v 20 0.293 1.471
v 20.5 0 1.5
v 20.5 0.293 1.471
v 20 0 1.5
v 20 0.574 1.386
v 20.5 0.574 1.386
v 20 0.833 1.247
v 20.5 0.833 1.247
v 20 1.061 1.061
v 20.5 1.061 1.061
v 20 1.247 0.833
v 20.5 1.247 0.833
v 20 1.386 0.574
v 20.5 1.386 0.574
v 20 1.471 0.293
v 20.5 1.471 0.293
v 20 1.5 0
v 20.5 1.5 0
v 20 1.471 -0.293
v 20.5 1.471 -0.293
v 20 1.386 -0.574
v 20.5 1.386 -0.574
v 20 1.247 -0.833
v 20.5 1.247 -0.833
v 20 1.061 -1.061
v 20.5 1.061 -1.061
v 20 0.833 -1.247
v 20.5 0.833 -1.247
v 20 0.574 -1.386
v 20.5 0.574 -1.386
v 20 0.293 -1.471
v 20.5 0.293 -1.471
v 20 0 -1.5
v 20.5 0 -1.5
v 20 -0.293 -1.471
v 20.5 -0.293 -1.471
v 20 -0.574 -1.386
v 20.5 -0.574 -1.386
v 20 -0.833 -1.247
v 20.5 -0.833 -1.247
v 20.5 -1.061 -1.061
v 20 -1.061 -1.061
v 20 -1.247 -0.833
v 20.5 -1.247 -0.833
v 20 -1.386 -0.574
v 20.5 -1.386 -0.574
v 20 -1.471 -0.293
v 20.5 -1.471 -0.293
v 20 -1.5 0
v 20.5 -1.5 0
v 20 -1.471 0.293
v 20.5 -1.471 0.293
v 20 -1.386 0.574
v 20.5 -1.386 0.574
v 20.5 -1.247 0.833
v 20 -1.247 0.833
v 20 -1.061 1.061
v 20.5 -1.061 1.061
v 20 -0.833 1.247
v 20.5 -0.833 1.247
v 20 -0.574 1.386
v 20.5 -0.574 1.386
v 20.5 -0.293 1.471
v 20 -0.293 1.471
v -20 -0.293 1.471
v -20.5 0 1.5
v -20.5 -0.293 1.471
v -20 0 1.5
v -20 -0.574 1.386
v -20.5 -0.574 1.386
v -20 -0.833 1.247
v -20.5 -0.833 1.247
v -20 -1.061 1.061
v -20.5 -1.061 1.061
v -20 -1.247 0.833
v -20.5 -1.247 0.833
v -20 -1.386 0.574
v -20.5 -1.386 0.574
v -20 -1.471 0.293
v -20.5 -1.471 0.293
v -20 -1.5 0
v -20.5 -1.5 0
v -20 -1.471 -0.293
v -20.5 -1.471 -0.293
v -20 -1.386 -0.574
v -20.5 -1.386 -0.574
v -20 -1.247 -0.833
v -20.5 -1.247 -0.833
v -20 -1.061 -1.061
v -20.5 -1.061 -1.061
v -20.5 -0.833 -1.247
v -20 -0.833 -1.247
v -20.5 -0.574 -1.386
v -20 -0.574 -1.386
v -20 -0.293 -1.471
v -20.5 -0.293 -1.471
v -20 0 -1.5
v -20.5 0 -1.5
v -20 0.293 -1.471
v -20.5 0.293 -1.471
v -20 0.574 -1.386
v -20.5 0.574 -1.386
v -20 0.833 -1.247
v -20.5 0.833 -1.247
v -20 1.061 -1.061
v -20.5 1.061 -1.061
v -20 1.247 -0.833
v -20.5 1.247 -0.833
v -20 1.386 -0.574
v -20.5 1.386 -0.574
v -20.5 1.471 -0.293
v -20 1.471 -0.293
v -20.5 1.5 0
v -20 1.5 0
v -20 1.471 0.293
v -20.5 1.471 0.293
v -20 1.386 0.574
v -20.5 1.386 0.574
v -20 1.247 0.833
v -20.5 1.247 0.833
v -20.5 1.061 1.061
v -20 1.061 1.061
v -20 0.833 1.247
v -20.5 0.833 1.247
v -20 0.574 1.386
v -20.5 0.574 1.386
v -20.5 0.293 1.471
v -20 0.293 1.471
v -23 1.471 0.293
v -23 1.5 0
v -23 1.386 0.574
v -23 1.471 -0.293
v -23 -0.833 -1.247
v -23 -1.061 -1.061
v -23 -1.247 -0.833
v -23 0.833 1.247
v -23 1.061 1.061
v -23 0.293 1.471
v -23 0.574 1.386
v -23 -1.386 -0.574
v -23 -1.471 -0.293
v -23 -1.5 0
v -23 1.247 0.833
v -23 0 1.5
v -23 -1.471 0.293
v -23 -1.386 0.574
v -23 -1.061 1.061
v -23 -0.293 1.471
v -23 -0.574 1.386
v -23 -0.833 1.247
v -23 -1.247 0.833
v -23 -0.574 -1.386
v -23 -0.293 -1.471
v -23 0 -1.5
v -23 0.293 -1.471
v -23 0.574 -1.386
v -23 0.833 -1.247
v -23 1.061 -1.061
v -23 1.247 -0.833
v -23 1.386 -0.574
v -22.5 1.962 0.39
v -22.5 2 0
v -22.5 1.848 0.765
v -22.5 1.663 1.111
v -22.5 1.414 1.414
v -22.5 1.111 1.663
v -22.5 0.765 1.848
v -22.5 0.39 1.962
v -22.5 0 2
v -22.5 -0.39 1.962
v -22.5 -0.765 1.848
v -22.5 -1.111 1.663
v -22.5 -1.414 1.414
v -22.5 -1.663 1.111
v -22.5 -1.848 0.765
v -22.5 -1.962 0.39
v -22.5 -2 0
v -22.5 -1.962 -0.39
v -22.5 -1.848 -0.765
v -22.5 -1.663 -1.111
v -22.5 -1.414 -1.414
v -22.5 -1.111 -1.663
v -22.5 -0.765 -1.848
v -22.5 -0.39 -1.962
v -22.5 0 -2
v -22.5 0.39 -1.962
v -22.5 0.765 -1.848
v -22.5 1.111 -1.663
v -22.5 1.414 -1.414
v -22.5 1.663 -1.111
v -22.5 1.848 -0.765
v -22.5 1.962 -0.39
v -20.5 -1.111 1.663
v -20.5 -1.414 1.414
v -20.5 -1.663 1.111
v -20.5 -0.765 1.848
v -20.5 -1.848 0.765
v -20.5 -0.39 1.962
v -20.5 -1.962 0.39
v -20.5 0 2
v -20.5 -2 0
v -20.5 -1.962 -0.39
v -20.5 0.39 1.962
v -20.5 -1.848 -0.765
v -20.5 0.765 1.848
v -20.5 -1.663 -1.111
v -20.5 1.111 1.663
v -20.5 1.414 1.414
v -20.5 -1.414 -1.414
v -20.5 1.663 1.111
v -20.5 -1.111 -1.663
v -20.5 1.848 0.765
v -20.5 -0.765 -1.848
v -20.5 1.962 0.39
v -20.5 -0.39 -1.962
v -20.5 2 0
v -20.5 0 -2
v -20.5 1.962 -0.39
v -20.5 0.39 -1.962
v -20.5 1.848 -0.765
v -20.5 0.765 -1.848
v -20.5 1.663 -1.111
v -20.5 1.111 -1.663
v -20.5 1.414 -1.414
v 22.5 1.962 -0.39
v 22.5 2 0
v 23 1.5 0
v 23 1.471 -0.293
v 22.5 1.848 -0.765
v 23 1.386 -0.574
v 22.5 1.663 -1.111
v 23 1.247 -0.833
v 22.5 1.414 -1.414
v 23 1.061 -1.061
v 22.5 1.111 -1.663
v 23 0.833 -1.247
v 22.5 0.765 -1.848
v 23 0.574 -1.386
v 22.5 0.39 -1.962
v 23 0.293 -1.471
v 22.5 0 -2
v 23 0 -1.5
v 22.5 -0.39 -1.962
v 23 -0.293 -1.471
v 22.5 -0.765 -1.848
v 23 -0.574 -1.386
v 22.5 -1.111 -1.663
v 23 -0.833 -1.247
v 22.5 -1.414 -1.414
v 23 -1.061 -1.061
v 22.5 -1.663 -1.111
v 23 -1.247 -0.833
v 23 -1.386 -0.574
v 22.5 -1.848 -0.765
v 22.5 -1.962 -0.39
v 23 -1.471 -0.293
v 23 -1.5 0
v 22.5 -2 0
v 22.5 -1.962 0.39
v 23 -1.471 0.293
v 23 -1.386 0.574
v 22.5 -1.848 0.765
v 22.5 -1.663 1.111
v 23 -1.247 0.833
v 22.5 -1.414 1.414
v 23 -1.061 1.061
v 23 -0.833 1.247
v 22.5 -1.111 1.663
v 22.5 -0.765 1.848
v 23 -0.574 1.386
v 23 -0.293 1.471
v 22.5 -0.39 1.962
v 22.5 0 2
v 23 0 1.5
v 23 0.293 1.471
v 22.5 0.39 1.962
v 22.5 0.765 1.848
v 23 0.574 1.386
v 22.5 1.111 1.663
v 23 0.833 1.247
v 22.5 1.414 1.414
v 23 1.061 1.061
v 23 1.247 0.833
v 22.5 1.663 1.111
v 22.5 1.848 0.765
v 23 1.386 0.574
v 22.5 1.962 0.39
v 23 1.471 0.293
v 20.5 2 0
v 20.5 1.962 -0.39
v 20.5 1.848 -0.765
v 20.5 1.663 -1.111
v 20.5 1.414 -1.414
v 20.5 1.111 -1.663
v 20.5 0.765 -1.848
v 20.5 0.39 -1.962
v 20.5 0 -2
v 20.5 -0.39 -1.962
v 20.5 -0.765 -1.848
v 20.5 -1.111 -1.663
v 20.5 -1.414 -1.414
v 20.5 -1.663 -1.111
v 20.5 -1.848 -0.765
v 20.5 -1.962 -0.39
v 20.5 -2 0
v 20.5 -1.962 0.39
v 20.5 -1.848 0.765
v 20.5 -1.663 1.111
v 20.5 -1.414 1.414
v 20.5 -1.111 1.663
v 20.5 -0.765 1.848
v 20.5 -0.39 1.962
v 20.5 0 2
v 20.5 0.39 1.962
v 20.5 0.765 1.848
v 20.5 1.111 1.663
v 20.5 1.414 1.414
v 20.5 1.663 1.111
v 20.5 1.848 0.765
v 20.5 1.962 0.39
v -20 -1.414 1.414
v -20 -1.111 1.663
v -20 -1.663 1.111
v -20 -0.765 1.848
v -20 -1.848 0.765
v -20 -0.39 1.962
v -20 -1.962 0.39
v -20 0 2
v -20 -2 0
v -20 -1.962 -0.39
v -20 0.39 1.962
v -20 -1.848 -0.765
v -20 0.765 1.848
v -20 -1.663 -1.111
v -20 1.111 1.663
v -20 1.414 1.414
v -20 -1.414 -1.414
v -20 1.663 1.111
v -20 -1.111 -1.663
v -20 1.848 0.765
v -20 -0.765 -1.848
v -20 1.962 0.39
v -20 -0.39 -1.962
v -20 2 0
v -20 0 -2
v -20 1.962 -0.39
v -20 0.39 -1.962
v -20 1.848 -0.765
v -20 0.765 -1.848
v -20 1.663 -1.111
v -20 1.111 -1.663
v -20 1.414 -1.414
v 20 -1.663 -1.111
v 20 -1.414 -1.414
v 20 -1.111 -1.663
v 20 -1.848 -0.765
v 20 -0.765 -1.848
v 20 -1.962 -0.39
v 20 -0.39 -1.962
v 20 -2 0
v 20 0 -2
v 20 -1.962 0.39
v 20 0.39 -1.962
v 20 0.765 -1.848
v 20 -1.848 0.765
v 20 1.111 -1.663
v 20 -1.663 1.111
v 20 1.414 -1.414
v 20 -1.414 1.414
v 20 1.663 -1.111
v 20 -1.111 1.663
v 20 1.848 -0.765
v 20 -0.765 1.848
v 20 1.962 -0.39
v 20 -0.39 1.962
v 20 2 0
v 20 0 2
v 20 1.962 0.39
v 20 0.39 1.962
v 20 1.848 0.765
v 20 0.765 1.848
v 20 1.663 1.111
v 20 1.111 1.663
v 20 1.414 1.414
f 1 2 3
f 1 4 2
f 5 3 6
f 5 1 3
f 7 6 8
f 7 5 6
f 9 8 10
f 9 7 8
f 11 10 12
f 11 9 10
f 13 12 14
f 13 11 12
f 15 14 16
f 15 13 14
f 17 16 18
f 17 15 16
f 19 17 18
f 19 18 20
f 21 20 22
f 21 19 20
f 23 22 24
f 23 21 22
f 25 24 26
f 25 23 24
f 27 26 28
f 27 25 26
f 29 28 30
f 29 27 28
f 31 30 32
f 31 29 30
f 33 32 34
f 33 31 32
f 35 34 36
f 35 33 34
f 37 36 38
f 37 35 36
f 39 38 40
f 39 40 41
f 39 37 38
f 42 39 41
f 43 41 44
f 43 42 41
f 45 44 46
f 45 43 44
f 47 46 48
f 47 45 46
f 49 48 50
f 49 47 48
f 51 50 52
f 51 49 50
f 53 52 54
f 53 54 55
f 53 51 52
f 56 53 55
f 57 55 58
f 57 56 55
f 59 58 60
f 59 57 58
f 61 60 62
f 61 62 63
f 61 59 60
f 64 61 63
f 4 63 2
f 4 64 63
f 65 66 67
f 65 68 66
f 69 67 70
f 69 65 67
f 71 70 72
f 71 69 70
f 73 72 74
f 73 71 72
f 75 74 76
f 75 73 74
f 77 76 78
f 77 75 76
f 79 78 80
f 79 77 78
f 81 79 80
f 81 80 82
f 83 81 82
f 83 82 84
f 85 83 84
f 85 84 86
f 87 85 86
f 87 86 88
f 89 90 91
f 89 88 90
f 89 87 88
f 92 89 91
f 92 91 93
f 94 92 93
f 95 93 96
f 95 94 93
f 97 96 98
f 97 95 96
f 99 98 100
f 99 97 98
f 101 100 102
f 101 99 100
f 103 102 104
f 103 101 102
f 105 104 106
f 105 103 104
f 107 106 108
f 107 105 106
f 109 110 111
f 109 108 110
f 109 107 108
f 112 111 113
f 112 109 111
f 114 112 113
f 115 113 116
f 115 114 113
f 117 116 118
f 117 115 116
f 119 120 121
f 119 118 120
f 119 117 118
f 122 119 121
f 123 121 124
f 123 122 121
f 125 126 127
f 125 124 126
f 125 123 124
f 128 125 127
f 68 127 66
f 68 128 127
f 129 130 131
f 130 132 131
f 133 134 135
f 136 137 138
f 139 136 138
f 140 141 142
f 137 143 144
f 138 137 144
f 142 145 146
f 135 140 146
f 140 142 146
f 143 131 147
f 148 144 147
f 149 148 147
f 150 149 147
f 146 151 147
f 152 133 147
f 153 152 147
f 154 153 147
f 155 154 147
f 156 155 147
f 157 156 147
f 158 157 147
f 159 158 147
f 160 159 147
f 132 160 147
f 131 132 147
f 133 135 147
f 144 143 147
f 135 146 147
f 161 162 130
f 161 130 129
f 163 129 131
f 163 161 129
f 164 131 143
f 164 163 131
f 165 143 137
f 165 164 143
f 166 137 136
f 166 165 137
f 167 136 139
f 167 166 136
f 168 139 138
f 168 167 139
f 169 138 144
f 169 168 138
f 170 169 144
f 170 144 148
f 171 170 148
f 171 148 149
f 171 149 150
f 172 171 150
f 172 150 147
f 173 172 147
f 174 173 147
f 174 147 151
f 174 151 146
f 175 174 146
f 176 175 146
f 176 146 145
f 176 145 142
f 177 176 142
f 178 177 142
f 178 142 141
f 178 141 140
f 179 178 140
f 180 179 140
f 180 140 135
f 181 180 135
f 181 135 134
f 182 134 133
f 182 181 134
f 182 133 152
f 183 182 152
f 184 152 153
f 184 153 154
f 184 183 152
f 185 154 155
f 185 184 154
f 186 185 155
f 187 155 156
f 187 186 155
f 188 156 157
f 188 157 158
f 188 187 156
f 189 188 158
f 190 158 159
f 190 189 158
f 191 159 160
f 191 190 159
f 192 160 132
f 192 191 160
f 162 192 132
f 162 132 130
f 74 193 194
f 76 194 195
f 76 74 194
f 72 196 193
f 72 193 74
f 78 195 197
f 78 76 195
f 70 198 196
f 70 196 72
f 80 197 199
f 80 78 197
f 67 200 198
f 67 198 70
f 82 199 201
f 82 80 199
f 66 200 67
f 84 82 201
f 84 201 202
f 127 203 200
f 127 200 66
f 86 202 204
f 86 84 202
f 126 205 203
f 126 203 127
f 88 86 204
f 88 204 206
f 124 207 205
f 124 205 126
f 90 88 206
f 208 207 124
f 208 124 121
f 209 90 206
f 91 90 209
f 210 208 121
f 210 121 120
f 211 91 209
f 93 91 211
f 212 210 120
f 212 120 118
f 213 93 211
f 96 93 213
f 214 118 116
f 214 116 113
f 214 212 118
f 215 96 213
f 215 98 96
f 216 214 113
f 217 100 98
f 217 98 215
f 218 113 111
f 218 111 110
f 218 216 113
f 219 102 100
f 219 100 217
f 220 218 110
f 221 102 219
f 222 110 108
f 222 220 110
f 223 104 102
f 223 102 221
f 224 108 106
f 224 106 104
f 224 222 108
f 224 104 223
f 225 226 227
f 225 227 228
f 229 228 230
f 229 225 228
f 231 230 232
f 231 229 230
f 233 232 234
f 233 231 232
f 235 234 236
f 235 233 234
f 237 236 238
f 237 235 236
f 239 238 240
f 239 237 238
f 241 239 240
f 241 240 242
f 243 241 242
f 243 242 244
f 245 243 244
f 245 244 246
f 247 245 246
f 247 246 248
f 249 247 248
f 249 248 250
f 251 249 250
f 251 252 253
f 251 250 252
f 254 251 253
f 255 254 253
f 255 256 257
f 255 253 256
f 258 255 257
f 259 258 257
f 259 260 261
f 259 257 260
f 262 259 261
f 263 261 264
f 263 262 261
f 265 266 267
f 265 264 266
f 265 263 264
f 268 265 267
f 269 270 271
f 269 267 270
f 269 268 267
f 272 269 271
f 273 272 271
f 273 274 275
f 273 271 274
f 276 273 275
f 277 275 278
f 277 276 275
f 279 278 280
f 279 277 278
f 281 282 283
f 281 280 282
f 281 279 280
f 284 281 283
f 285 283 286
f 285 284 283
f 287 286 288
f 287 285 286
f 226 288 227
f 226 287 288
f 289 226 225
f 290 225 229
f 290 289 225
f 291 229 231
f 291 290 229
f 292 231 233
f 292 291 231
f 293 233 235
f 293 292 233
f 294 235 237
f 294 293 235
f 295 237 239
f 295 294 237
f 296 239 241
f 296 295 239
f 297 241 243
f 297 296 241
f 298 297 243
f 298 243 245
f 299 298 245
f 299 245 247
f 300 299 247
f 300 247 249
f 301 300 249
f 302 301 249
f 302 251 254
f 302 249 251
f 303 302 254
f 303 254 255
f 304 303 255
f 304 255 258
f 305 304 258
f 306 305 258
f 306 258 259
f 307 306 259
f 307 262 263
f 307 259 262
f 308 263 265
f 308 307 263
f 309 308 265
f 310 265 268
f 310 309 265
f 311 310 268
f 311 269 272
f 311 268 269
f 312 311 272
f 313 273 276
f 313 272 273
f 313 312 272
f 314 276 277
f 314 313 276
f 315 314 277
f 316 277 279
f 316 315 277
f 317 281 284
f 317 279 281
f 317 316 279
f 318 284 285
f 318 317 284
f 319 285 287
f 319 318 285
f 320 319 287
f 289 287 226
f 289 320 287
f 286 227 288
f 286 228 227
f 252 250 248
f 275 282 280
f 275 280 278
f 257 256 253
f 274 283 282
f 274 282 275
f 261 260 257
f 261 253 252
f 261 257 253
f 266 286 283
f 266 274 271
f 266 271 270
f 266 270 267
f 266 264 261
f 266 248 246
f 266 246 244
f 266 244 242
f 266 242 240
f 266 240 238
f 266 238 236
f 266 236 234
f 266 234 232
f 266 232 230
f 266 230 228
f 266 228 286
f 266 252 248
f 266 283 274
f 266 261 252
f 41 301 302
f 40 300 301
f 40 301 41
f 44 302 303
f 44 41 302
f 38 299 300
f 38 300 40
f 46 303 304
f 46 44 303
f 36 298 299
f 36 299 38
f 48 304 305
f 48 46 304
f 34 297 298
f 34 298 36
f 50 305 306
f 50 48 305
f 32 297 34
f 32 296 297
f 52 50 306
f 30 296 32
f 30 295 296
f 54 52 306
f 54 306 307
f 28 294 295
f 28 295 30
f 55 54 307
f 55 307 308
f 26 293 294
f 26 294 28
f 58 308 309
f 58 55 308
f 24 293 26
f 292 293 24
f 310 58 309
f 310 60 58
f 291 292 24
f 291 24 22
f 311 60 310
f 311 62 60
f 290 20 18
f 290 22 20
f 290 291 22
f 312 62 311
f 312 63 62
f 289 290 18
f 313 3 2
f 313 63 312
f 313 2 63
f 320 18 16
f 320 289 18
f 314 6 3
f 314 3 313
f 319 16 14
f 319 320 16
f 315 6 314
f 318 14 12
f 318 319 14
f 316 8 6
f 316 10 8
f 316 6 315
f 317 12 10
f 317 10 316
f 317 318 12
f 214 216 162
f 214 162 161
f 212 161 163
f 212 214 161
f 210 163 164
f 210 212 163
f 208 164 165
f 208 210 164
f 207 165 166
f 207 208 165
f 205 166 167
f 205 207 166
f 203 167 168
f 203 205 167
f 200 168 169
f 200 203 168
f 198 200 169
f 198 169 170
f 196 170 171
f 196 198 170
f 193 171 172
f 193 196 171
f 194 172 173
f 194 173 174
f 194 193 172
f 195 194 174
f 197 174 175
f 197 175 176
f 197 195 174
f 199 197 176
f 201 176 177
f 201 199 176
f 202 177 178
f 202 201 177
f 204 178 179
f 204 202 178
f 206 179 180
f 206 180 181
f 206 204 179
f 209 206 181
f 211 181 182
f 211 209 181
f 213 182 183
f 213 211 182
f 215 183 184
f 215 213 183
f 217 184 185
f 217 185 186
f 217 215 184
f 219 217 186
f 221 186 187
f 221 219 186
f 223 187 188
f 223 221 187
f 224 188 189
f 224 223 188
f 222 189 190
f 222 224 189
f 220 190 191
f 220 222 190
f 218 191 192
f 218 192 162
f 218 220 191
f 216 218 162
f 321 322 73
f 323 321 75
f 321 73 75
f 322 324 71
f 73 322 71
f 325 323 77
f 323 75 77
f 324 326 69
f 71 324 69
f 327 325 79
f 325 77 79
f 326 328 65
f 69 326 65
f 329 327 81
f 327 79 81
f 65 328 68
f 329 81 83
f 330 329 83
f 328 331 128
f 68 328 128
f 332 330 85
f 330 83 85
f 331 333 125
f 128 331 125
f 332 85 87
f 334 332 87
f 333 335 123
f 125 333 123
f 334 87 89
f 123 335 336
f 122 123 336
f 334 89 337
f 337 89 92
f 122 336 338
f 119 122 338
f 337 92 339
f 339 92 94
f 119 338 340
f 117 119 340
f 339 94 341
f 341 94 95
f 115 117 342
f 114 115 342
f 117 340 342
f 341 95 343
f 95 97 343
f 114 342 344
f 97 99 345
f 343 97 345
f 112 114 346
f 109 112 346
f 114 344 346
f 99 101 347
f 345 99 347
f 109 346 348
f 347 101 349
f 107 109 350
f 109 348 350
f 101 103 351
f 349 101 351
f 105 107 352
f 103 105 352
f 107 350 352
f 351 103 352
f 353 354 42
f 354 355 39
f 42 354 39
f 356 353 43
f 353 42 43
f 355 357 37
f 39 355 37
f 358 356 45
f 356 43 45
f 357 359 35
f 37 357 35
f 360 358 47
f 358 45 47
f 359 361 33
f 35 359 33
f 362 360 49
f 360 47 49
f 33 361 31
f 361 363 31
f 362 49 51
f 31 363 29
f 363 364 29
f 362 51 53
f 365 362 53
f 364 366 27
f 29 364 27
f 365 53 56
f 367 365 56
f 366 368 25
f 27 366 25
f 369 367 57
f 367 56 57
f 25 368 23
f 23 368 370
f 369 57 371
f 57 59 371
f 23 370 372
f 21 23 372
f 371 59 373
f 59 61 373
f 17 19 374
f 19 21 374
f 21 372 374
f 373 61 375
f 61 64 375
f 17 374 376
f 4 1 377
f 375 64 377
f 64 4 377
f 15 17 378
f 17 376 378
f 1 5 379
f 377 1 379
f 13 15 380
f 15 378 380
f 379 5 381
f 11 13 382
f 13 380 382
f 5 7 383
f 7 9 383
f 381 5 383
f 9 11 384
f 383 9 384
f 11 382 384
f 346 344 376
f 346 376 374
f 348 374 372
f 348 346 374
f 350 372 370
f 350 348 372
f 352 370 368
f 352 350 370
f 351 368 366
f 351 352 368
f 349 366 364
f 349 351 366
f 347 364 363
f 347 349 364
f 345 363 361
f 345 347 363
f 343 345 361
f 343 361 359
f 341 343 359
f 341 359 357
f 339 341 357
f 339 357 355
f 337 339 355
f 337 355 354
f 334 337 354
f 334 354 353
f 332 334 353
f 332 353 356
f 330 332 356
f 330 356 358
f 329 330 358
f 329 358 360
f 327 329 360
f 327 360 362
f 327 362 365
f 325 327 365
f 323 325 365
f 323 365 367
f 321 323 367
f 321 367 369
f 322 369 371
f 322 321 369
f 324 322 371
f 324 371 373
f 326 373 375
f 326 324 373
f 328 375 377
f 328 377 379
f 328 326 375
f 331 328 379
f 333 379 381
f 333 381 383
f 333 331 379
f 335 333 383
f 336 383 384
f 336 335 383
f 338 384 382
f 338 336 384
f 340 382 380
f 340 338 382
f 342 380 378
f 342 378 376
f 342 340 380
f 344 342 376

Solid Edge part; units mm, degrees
sketch "Sketch1" plane through (0, 0, 0) normal (1, 0, 0) x (0, 1, 0)
  circle A0 centre (0, 0) radius 2
extrude "Protrusion1" add sketch "Sketch1" along normal mid plane 46
chamfer "Chamfer_1" distance 0.5 angle 45 2 edges at (23, -2, 0) (-23, -2, 0)
sketch "Sketch2" plane through (0, 0, 0) normal (0, -1, 0) x (1, 0, 0)
  line L0 (20.5, 2) -> (20.5, 1.5)
  line L1 (20.5, 1.5) -> (20, 1.5)
  line L2 (20, 1.5) -> (20, 2)
  line L3 (20, 2) -> (20.5, 2)
revolve "RevolvedCutout1" cut sketch "Sketch2" angle 360 about axis through (23, 0, 0) along (-1, 0, 0)
mirror "Mirror1" about plane through (0, 0, 0) normal (1, 0, 0) of "RevolvedCutout1"
properties material "PVC"
